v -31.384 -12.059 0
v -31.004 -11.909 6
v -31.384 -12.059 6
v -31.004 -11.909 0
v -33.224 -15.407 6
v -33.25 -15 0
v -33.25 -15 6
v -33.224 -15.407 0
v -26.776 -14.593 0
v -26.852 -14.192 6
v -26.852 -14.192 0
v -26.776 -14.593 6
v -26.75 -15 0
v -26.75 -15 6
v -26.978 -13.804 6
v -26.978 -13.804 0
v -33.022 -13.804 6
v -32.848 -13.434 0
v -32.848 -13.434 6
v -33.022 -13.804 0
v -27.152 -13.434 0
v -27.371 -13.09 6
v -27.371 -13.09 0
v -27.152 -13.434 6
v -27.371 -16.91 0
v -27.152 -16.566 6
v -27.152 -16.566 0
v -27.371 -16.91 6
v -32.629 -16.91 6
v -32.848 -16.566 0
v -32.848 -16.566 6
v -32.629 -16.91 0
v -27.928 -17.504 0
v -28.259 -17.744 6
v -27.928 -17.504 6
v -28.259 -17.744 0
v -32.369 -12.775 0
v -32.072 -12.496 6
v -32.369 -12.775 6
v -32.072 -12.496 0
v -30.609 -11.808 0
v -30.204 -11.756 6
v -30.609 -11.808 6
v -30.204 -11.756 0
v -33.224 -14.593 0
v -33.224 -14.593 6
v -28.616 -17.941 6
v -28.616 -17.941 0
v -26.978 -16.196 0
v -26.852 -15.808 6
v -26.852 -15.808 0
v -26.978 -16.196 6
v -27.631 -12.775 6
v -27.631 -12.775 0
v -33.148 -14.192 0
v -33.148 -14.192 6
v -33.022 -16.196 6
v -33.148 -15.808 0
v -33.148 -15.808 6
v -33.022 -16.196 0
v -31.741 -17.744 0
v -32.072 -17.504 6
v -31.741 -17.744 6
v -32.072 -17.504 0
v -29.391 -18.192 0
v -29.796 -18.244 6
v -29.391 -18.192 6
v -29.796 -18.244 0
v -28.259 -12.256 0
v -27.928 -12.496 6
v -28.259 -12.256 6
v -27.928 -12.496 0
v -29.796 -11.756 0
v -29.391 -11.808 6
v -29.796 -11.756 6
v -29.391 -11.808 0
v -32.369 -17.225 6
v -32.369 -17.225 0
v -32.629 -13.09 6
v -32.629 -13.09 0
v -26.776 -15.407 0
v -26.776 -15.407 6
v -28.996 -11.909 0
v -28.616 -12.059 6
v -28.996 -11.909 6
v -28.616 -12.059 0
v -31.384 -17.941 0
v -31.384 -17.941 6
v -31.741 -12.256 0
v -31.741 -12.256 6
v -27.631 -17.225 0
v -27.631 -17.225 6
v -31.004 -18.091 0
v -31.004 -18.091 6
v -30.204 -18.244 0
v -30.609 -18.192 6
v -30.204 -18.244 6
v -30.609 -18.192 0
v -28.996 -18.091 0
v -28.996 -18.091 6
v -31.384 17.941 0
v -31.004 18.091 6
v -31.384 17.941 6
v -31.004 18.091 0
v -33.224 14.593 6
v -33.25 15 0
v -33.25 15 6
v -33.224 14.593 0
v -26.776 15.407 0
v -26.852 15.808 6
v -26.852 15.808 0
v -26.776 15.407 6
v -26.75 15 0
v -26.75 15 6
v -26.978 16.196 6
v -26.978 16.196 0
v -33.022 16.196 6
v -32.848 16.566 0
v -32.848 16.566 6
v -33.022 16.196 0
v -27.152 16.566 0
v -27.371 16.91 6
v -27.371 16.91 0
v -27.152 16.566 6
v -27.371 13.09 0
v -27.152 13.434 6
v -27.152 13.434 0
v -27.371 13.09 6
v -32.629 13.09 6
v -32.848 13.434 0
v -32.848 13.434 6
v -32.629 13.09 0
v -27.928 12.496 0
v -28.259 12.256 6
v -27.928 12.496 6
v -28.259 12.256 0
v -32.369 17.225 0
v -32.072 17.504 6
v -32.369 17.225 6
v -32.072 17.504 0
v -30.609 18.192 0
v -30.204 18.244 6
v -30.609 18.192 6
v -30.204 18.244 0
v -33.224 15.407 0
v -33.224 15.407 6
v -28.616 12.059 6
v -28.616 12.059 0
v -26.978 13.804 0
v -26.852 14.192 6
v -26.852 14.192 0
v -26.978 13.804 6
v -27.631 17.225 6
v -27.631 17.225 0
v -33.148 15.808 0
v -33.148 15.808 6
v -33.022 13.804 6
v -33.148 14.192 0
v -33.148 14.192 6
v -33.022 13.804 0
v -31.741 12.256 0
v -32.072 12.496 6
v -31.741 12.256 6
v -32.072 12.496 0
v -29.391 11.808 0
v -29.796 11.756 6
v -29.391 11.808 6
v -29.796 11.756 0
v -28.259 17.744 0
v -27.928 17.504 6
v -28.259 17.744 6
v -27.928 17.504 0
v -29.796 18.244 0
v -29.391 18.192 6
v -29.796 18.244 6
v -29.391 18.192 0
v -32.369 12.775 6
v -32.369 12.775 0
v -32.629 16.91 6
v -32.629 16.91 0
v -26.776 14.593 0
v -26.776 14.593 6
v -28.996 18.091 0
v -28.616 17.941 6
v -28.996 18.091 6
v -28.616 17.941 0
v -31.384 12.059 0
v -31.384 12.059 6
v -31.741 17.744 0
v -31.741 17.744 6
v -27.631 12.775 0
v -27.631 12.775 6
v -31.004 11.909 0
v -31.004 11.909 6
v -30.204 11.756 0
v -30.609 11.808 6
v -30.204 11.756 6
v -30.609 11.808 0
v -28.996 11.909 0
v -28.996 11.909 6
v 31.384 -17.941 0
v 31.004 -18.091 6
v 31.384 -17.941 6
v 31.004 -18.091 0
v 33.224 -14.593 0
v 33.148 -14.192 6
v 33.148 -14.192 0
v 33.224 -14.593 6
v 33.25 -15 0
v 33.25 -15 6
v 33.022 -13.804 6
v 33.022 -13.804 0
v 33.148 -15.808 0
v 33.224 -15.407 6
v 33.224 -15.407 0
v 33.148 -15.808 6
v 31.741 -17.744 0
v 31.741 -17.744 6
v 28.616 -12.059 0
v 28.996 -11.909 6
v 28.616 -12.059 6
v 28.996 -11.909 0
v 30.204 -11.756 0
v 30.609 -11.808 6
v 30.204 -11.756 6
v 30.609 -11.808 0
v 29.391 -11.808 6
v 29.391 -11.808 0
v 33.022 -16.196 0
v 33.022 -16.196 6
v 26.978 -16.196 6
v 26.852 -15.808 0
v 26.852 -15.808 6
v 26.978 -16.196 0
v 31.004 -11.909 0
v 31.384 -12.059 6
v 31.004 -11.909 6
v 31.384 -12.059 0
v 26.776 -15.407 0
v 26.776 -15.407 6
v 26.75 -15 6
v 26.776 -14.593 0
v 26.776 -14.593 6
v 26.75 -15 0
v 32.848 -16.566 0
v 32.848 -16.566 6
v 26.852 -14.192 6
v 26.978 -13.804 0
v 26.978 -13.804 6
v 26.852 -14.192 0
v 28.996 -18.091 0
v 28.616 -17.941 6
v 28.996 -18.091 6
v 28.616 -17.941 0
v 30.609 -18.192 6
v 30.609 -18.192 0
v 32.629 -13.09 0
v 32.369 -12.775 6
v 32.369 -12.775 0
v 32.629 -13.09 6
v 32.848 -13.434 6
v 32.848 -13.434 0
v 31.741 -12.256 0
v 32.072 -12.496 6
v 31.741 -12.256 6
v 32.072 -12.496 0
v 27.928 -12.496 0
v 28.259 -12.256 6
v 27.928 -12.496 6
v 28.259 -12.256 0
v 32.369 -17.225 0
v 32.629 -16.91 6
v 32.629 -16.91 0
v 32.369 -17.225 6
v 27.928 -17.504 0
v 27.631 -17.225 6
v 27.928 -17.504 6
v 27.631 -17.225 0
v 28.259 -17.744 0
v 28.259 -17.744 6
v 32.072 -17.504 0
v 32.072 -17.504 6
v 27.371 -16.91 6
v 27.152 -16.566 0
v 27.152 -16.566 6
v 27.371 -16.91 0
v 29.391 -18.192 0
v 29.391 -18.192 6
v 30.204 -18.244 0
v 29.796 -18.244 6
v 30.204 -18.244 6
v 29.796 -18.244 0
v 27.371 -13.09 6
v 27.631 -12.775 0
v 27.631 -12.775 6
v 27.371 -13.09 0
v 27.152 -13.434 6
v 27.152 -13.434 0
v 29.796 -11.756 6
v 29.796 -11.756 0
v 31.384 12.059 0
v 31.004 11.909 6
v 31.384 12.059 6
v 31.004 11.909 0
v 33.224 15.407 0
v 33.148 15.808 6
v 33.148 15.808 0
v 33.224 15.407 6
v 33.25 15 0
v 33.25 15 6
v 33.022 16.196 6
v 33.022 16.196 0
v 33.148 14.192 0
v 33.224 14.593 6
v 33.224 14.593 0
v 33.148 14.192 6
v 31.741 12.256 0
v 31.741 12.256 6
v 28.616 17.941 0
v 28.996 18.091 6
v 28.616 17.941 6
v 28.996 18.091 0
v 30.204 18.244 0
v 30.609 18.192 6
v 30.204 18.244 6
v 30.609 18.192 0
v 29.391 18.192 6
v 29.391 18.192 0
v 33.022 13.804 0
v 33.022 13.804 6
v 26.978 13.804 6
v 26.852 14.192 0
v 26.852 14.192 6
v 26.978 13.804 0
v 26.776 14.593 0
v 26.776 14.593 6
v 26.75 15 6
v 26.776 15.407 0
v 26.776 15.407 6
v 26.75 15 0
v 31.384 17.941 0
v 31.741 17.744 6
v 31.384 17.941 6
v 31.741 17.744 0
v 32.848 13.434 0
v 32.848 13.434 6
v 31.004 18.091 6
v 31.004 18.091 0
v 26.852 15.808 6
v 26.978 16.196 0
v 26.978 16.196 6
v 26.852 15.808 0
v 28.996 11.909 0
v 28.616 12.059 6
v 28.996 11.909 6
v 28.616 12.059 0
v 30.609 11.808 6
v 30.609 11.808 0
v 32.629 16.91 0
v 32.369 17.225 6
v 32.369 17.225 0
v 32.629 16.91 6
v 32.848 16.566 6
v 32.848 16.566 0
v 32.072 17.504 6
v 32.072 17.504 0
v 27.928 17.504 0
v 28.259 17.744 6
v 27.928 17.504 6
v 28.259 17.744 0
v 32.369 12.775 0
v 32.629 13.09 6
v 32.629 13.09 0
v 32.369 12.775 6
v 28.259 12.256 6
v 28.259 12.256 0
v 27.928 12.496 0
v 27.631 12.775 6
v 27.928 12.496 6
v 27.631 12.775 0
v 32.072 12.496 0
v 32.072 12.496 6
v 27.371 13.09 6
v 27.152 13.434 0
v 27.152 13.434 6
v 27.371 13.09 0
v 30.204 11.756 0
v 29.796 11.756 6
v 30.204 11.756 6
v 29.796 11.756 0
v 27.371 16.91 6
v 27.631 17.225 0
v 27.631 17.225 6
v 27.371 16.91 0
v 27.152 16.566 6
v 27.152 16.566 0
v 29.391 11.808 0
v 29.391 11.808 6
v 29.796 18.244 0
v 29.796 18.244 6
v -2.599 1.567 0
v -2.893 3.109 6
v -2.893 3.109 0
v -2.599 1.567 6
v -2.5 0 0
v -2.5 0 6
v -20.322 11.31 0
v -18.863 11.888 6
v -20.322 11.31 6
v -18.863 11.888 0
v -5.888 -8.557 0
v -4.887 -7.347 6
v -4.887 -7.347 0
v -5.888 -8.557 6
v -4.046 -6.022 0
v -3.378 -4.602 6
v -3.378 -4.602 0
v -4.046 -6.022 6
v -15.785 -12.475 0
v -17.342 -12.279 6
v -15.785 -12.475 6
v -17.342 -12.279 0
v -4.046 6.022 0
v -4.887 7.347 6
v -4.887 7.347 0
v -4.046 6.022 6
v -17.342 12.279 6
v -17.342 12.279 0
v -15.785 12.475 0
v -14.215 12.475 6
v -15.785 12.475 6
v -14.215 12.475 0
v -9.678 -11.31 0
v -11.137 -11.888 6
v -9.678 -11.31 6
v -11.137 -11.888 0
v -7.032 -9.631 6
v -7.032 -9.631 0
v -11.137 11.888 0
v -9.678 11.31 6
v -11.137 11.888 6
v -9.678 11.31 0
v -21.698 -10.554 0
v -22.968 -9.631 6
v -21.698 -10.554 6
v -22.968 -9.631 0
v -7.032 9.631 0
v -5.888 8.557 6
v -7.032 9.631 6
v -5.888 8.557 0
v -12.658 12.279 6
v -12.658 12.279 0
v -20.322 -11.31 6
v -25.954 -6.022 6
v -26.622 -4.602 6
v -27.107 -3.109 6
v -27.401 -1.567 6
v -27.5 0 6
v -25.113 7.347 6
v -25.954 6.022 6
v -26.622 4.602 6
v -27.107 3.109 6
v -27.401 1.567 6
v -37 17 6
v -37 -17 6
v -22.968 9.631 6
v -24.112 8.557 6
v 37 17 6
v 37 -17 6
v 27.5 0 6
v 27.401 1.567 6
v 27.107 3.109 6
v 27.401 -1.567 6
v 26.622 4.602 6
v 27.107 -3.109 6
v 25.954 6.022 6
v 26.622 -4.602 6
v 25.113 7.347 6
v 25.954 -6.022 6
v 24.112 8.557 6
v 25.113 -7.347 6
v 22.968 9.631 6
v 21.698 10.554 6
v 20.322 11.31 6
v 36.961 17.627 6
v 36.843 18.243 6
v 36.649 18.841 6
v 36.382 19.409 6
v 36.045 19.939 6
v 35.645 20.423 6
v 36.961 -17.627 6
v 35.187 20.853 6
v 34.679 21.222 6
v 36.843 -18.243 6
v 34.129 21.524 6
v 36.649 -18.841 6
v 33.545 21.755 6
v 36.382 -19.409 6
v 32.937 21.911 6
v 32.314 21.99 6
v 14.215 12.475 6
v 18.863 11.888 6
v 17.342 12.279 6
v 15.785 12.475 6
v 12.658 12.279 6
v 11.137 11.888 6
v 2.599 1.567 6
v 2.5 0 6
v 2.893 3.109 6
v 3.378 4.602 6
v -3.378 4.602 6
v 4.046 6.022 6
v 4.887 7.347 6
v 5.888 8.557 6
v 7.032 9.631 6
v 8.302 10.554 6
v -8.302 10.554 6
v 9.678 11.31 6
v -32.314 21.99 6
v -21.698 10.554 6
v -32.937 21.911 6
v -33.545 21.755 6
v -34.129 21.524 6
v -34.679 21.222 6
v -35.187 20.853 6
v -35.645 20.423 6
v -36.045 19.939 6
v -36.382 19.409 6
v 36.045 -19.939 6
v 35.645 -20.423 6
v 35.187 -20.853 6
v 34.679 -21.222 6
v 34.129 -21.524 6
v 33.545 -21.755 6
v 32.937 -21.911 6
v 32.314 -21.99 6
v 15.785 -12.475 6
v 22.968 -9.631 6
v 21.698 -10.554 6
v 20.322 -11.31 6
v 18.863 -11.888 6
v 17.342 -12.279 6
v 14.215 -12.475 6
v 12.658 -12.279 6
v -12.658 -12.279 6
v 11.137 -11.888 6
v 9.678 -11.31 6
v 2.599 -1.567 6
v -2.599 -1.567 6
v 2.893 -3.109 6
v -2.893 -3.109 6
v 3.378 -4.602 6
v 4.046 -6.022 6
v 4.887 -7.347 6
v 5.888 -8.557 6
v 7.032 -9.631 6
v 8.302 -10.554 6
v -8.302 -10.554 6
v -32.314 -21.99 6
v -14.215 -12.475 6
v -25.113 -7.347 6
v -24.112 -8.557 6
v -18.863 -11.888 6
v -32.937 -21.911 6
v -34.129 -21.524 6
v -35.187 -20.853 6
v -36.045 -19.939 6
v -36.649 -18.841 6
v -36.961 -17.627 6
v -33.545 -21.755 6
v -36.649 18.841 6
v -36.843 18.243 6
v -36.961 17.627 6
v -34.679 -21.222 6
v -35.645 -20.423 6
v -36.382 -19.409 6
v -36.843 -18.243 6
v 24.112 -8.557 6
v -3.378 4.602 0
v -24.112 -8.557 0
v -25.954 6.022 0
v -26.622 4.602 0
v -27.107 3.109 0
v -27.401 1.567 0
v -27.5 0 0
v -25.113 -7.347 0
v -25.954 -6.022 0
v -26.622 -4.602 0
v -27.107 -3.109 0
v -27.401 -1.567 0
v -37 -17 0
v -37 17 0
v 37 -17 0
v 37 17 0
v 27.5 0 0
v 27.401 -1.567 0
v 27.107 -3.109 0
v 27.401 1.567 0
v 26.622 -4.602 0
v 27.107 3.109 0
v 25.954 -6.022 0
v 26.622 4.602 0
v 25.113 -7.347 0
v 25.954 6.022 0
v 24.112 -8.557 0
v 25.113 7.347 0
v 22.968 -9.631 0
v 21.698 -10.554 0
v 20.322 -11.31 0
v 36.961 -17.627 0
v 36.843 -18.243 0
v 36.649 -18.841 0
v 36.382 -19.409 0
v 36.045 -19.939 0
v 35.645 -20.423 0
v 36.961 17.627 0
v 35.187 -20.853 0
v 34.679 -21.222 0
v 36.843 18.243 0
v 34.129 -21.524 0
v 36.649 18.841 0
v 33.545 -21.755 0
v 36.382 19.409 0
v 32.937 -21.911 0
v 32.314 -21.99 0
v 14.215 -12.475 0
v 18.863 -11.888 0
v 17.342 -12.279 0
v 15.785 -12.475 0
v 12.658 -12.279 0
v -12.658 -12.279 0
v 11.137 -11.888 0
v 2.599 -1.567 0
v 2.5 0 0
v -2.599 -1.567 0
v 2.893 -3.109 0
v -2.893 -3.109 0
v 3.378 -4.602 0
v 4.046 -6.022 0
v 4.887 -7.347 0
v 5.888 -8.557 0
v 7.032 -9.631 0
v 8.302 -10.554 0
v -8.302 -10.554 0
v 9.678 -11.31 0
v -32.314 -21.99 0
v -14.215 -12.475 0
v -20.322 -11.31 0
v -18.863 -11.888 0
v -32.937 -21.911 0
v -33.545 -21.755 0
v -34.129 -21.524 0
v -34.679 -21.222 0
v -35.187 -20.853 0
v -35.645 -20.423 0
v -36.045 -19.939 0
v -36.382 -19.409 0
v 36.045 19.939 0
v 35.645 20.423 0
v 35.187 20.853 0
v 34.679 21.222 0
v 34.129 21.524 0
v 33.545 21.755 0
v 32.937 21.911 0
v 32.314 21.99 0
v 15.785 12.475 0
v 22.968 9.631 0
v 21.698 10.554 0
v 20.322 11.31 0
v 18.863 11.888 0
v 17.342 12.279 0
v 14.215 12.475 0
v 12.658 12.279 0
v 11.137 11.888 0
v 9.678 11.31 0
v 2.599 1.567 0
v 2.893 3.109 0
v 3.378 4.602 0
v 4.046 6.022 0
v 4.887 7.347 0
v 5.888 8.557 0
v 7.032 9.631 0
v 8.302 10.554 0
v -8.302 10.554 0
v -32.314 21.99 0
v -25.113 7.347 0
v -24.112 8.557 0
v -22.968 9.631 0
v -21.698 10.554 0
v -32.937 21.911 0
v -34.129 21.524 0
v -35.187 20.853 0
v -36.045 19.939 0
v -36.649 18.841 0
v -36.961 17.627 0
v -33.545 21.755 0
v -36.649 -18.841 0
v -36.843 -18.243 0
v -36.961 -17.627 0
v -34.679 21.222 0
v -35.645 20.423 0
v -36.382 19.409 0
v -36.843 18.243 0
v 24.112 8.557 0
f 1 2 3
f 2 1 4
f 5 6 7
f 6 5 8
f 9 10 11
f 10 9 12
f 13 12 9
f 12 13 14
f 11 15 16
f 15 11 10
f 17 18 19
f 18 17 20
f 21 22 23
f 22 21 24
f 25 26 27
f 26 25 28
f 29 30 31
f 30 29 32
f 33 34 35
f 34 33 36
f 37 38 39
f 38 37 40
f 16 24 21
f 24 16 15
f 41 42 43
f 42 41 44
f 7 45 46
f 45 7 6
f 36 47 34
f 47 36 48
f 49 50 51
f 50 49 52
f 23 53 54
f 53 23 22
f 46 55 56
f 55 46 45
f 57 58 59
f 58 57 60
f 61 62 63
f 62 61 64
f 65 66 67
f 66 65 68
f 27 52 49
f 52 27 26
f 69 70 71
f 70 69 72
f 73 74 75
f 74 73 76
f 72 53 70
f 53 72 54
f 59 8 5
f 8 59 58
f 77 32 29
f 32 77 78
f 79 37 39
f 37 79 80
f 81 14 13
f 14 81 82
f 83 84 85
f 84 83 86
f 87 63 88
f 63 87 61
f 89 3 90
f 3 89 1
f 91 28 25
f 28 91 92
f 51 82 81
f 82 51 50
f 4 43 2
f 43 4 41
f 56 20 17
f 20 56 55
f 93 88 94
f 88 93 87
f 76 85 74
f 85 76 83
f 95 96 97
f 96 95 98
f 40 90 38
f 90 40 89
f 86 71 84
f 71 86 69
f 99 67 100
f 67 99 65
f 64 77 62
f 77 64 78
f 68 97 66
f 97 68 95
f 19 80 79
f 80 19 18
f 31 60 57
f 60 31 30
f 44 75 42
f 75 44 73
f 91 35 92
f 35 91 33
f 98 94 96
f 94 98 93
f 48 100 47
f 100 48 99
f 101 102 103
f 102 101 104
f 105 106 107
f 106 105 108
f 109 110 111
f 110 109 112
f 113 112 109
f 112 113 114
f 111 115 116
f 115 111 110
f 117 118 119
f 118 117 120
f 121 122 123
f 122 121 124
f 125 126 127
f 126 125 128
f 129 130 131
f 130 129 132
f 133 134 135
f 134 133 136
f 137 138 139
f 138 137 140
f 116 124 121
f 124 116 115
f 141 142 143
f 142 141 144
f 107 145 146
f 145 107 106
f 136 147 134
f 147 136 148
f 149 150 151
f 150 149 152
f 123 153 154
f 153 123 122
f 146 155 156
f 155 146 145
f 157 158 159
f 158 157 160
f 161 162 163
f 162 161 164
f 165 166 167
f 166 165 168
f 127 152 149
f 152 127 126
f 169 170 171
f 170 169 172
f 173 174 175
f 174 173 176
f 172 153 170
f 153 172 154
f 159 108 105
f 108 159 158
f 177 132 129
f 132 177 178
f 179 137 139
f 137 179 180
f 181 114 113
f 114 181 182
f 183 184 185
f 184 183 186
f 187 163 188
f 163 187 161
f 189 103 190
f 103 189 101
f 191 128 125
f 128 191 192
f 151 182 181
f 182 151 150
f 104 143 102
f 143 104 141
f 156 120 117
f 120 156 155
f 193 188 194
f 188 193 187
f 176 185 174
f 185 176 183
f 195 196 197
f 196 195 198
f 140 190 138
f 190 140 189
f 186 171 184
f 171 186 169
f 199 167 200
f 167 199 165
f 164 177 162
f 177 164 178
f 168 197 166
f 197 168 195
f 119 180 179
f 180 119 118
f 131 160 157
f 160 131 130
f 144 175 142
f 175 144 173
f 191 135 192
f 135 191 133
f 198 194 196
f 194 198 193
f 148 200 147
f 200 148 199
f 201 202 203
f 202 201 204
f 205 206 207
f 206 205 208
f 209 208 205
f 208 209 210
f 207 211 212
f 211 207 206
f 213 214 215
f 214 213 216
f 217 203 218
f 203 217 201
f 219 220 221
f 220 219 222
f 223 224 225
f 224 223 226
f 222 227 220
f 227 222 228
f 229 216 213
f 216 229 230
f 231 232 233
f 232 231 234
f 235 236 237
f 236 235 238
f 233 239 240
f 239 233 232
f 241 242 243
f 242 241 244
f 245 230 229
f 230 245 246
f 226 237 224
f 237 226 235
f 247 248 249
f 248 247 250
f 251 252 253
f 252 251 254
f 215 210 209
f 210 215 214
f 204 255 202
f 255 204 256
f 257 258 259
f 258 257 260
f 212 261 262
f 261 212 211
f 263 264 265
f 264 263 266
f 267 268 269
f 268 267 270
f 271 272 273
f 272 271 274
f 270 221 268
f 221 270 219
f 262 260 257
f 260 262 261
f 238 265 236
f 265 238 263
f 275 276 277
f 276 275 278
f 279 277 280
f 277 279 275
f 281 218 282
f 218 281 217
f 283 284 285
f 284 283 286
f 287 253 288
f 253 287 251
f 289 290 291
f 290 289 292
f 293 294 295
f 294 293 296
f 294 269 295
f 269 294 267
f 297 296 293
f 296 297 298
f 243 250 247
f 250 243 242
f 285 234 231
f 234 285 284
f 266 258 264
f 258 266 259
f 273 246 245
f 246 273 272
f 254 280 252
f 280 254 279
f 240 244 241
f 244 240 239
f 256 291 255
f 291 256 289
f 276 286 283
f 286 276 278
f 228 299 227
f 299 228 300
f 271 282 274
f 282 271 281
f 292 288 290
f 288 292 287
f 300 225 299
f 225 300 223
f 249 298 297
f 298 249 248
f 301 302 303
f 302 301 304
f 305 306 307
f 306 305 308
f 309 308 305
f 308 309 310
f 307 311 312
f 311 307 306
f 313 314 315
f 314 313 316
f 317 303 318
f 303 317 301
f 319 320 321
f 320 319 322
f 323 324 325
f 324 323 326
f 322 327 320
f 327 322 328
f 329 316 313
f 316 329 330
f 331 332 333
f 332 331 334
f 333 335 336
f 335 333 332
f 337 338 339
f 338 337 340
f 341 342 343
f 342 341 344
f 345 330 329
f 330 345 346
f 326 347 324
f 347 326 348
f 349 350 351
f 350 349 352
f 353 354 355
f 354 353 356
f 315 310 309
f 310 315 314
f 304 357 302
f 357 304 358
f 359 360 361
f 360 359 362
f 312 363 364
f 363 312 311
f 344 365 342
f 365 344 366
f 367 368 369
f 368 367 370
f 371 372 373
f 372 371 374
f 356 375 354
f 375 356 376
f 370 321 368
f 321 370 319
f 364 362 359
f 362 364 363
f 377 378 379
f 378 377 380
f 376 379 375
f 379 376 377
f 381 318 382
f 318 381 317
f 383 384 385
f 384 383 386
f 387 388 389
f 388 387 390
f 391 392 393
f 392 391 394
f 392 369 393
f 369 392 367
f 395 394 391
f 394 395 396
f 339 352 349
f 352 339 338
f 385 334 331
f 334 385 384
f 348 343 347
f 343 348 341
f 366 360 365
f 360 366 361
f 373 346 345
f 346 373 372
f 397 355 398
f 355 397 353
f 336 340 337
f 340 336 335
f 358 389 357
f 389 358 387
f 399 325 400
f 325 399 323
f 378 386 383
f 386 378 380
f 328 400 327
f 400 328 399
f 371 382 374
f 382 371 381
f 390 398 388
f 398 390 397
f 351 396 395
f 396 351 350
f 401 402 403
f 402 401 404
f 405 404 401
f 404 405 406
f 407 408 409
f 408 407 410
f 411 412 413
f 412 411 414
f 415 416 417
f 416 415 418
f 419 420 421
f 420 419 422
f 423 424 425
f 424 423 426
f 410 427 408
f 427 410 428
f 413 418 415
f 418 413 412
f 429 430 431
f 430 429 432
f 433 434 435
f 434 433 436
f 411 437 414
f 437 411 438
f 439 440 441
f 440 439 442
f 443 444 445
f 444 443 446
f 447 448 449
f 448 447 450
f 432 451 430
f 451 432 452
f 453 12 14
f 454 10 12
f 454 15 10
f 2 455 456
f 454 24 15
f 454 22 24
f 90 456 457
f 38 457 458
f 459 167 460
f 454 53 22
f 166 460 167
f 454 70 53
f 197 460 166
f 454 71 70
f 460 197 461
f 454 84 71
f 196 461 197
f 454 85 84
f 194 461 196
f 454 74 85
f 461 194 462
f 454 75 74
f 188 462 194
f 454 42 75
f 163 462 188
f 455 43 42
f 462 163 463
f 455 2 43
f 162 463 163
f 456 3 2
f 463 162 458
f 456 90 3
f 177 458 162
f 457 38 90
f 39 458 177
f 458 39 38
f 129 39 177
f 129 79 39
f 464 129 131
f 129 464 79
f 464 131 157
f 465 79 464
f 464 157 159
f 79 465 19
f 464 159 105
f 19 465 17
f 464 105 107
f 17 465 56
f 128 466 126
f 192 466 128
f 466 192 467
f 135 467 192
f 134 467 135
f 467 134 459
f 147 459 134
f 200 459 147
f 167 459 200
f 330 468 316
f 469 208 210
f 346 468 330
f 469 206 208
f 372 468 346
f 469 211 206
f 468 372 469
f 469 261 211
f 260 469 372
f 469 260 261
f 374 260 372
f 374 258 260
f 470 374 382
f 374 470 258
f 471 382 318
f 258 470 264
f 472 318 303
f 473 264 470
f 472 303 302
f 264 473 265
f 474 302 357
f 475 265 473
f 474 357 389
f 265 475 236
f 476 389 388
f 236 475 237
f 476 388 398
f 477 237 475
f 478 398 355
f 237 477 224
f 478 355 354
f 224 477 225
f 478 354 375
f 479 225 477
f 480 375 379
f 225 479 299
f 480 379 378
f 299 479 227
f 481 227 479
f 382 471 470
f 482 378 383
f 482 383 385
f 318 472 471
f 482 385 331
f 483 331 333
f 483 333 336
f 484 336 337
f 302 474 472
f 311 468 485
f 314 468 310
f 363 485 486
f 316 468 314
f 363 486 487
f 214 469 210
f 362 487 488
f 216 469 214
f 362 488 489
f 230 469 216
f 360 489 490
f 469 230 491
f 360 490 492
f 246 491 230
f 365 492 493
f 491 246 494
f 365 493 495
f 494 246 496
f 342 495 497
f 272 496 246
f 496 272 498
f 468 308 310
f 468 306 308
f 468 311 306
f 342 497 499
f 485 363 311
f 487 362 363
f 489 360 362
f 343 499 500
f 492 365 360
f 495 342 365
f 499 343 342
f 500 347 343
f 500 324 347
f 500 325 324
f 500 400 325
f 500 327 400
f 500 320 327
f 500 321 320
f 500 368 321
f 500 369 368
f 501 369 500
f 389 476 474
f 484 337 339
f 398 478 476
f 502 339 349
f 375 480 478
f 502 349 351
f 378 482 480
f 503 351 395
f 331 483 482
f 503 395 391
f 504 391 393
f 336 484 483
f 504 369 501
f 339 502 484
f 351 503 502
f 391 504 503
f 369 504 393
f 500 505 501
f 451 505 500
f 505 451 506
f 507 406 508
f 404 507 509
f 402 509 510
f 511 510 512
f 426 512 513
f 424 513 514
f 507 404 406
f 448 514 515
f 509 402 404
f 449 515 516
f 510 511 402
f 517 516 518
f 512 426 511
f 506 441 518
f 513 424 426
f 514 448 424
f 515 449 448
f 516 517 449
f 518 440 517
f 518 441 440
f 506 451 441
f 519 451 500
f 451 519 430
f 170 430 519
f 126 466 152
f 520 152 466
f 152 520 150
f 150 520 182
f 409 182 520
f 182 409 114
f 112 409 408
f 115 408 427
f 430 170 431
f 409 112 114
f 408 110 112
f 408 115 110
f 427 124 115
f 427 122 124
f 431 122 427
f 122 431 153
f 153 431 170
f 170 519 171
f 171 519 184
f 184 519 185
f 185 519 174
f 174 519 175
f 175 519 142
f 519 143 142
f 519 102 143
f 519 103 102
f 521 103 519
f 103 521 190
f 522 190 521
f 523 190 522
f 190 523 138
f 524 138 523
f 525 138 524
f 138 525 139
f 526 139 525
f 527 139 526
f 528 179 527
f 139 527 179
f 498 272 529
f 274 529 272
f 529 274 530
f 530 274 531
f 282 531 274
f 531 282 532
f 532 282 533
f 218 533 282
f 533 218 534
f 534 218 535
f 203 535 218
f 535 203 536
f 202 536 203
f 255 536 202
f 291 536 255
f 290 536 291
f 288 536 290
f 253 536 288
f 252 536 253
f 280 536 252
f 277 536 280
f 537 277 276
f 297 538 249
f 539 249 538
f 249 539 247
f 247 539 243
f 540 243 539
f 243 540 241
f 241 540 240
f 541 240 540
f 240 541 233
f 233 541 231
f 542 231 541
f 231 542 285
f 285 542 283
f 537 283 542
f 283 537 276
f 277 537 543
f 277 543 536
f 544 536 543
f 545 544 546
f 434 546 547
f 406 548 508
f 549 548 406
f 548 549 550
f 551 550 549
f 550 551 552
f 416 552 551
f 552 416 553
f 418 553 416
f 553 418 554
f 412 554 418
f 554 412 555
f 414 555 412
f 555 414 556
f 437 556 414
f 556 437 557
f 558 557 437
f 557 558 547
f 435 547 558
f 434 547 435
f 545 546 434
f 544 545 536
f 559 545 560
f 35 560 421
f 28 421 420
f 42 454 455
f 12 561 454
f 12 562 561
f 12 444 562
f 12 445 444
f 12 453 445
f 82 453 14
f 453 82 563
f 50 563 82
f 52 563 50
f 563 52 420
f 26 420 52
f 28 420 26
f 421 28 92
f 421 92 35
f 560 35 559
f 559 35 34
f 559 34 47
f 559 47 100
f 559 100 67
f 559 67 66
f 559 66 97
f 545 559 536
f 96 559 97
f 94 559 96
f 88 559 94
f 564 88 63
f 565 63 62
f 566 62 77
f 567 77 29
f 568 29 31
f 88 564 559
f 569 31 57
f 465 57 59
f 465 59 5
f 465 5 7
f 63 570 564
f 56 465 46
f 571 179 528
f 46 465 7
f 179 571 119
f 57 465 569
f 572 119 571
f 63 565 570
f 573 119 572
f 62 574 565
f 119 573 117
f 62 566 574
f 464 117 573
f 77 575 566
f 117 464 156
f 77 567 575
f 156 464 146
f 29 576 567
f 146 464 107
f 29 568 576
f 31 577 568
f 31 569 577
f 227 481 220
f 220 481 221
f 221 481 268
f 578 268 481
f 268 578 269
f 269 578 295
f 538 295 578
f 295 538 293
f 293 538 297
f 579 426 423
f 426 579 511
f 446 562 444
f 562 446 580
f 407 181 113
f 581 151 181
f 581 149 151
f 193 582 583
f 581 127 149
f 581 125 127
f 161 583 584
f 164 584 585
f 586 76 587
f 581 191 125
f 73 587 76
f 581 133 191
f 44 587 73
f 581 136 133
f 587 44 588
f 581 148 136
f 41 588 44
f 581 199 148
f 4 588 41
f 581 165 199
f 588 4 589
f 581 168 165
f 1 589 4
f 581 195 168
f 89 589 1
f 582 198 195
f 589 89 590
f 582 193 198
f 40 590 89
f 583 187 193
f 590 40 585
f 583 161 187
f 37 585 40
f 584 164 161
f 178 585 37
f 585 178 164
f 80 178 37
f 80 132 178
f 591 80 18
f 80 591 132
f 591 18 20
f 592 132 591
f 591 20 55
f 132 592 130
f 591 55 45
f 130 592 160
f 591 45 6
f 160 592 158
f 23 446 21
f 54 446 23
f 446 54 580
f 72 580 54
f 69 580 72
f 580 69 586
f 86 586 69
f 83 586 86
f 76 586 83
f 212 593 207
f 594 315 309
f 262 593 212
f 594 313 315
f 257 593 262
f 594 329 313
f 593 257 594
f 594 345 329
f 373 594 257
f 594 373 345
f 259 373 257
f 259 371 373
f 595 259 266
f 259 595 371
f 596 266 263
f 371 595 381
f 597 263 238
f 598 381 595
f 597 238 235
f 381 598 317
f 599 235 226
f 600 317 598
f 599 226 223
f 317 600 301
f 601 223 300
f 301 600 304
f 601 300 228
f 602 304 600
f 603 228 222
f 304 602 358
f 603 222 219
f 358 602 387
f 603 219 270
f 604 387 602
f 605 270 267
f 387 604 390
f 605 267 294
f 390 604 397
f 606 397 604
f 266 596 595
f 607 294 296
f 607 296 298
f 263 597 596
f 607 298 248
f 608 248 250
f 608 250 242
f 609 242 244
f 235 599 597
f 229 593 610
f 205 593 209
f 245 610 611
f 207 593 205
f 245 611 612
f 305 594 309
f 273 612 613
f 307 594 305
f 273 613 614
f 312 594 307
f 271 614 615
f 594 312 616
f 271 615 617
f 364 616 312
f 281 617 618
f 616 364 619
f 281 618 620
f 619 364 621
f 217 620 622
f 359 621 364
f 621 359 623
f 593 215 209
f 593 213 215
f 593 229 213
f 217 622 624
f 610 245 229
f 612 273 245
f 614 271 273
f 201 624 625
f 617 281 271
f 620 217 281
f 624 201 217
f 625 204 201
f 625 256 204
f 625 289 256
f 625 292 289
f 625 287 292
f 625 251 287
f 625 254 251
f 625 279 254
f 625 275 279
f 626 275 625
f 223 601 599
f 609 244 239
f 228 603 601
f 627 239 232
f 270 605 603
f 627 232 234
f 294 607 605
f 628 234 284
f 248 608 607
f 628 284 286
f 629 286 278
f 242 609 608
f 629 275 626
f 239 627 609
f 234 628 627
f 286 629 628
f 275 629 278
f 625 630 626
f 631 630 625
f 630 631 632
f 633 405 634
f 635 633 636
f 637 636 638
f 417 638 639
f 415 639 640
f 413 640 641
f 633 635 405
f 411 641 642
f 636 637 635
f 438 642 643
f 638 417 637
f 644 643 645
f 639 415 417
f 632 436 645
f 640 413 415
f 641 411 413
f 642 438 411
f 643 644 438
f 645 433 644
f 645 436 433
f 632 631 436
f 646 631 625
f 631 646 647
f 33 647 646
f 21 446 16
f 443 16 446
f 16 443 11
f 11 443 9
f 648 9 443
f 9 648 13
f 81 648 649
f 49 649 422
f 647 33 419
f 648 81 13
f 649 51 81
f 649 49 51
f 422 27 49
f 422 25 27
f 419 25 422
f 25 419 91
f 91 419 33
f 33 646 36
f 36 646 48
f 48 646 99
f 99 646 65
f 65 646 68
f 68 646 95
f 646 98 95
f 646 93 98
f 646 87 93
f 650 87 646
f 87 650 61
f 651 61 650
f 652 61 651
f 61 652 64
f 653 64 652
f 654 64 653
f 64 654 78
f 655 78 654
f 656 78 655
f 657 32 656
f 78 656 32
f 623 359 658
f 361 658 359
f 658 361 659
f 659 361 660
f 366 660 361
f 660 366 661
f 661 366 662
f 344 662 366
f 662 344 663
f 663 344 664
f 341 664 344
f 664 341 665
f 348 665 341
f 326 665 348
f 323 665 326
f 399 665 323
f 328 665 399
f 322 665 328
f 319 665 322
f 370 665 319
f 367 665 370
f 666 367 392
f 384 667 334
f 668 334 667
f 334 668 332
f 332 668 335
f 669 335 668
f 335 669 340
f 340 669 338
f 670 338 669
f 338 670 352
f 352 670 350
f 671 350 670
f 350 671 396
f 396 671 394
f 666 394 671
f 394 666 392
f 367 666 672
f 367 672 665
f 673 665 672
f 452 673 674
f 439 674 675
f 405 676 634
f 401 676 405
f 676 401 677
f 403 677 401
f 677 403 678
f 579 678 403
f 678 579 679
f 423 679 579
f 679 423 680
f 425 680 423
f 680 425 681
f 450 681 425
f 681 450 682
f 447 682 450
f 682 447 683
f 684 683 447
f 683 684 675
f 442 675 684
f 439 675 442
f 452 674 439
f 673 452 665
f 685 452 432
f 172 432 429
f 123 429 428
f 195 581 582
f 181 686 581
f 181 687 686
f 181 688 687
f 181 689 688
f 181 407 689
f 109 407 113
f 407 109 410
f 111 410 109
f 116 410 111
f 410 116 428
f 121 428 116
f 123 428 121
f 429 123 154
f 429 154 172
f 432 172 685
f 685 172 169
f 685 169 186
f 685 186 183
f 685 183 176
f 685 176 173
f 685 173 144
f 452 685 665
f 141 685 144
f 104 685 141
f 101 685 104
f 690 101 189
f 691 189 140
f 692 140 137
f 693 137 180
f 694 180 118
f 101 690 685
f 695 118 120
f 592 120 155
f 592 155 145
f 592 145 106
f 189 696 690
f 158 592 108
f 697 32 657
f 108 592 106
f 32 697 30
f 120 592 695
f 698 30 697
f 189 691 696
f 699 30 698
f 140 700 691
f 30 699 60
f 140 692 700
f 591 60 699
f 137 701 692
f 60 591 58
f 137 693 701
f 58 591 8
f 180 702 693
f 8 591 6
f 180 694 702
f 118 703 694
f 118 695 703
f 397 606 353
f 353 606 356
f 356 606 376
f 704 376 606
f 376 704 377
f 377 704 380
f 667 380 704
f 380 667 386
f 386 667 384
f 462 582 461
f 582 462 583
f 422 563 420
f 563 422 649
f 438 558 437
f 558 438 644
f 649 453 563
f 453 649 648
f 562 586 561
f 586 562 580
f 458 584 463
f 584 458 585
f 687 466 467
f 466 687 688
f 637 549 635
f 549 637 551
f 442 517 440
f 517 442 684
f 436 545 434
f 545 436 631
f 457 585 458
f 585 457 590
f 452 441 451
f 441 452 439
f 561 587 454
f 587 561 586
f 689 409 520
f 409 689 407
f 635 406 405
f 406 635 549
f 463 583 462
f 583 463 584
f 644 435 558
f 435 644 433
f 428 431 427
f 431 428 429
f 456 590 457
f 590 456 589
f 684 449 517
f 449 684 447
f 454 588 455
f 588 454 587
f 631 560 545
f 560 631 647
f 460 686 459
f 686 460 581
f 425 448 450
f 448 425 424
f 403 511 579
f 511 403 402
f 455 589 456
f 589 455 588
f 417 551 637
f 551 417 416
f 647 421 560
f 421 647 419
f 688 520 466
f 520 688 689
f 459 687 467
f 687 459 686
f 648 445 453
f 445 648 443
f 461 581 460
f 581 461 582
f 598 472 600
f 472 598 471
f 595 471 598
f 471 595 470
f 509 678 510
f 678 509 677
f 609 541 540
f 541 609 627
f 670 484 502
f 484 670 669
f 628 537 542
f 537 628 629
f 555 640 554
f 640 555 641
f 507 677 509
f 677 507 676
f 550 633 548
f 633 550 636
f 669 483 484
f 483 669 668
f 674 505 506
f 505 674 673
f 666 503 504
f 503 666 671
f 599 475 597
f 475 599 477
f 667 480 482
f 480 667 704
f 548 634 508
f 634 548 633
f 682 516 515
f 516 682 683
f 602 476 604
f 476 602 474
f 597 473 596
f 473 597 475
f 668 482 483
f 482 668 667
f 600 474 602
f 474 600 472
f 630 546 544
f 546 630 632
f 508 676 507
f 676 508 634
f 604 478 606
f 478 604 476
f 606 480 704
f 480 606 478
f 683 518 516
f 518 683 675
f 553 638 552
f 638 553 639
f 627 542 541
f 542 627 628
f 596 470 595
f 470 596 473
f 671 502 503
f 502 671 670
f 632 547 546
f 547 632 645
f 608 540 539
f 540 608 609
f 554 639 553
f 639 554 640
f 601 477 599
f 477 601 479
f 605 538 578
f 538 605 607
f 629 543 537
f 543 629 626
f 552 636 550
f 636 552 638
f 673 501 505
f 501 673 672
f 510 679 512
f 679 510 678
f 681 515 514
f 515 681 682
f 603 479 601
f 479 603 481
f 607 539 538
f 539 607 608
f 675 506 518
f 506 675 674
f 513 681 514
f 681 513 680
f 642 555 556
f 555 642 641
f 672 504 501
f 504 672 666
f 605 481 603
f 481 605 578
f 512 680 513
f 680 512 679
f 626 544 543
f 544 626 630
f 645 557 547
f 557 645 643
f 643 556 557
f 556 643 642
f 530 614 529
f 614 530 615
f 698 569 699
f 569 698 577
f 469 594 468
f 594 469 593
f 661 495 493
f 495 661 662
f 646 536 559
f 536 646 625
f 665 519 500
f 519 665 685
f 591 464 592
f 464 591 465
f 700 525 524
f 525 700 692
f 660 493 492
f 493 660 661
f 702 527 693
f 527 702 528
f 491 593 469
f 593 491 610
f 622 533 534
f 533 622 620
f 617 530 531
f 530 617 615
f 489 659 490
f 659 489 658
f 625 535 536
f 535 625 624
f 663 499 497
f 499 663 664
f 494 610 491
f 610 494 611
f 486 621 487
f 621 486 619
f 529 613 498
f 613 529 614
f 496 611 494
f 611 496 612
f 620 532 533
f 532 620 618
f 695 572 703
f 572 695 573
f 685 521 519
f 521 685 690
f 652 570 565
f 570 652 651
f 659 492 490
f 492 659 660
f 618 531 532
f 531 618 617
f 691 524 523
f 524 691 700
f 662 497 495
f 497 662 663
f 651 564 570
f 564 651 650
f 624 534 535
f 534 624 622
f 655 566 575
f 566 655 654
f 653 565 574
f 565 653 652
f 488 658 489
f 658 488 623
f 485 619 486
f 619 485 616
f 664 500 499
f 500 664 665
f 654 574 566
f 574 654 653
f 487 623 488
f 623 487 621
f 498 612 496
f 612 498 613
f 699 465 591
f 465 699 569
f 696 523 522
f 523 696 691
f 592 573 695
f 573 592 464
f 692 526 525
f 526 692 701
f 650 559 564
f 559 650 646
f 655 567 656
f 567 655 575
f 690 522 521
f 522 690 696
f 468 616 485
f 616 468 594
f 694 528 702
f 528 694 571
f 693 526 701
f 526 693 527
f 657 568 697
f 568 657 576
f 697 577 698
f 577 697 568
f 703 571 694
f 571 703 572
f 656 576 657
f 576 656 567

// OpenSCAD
$fn = 50;


difference() {
	union() {
		hull() {
			translate(v = [-32.0000000000, 17.0000000000, 0]) {
				cylinder(h = 6, r = 5);
			}
			translate(v = [32.0000000000, 17.0000000000, 0]) {
				cylinder(h = 6, r = 5);
			}
			translate(v = [-32.0000000000, -17.0000000000, 0]) {
				cylinder(h = 6, r = 5);
			}
			translate(v = [32.0000000000, -17.0000000000, 0]) {
				cylinder(h = 6, r = 5);
			}
		}
	}
	union() {
		#translate(v = [-30.0000000000, -15.0000000000, -100.0000000000]) {
			cylinder(h = 200, r = 3.2500000000);
		}
		#translate(v = [-30.0000000000, 15.0000000000, -100.0000000000]) {
			cylinder(h = 200, r = 3.2500000000);
		}
		#translate(v = [30.0000000000, -15.0000000000, -100.0000000000]) {
			cylinder(h = 200, r = 3.2500000000);
		}
		#translate(v = [30.0000000000, 15.0000000000, -100.0000000000]) {
			cylinder(h = 200, r = 3.2500000000);
		}
		#translate(v = [-15.0000000000, 0, 0]) {
			cylinder(h = 6, r = 12.5000000000);
		}
		#translate(v = [15.0000000000, 0, 0]) {
			cylinder(h = 6, r = 12.5000000000);
		}
	}
}
